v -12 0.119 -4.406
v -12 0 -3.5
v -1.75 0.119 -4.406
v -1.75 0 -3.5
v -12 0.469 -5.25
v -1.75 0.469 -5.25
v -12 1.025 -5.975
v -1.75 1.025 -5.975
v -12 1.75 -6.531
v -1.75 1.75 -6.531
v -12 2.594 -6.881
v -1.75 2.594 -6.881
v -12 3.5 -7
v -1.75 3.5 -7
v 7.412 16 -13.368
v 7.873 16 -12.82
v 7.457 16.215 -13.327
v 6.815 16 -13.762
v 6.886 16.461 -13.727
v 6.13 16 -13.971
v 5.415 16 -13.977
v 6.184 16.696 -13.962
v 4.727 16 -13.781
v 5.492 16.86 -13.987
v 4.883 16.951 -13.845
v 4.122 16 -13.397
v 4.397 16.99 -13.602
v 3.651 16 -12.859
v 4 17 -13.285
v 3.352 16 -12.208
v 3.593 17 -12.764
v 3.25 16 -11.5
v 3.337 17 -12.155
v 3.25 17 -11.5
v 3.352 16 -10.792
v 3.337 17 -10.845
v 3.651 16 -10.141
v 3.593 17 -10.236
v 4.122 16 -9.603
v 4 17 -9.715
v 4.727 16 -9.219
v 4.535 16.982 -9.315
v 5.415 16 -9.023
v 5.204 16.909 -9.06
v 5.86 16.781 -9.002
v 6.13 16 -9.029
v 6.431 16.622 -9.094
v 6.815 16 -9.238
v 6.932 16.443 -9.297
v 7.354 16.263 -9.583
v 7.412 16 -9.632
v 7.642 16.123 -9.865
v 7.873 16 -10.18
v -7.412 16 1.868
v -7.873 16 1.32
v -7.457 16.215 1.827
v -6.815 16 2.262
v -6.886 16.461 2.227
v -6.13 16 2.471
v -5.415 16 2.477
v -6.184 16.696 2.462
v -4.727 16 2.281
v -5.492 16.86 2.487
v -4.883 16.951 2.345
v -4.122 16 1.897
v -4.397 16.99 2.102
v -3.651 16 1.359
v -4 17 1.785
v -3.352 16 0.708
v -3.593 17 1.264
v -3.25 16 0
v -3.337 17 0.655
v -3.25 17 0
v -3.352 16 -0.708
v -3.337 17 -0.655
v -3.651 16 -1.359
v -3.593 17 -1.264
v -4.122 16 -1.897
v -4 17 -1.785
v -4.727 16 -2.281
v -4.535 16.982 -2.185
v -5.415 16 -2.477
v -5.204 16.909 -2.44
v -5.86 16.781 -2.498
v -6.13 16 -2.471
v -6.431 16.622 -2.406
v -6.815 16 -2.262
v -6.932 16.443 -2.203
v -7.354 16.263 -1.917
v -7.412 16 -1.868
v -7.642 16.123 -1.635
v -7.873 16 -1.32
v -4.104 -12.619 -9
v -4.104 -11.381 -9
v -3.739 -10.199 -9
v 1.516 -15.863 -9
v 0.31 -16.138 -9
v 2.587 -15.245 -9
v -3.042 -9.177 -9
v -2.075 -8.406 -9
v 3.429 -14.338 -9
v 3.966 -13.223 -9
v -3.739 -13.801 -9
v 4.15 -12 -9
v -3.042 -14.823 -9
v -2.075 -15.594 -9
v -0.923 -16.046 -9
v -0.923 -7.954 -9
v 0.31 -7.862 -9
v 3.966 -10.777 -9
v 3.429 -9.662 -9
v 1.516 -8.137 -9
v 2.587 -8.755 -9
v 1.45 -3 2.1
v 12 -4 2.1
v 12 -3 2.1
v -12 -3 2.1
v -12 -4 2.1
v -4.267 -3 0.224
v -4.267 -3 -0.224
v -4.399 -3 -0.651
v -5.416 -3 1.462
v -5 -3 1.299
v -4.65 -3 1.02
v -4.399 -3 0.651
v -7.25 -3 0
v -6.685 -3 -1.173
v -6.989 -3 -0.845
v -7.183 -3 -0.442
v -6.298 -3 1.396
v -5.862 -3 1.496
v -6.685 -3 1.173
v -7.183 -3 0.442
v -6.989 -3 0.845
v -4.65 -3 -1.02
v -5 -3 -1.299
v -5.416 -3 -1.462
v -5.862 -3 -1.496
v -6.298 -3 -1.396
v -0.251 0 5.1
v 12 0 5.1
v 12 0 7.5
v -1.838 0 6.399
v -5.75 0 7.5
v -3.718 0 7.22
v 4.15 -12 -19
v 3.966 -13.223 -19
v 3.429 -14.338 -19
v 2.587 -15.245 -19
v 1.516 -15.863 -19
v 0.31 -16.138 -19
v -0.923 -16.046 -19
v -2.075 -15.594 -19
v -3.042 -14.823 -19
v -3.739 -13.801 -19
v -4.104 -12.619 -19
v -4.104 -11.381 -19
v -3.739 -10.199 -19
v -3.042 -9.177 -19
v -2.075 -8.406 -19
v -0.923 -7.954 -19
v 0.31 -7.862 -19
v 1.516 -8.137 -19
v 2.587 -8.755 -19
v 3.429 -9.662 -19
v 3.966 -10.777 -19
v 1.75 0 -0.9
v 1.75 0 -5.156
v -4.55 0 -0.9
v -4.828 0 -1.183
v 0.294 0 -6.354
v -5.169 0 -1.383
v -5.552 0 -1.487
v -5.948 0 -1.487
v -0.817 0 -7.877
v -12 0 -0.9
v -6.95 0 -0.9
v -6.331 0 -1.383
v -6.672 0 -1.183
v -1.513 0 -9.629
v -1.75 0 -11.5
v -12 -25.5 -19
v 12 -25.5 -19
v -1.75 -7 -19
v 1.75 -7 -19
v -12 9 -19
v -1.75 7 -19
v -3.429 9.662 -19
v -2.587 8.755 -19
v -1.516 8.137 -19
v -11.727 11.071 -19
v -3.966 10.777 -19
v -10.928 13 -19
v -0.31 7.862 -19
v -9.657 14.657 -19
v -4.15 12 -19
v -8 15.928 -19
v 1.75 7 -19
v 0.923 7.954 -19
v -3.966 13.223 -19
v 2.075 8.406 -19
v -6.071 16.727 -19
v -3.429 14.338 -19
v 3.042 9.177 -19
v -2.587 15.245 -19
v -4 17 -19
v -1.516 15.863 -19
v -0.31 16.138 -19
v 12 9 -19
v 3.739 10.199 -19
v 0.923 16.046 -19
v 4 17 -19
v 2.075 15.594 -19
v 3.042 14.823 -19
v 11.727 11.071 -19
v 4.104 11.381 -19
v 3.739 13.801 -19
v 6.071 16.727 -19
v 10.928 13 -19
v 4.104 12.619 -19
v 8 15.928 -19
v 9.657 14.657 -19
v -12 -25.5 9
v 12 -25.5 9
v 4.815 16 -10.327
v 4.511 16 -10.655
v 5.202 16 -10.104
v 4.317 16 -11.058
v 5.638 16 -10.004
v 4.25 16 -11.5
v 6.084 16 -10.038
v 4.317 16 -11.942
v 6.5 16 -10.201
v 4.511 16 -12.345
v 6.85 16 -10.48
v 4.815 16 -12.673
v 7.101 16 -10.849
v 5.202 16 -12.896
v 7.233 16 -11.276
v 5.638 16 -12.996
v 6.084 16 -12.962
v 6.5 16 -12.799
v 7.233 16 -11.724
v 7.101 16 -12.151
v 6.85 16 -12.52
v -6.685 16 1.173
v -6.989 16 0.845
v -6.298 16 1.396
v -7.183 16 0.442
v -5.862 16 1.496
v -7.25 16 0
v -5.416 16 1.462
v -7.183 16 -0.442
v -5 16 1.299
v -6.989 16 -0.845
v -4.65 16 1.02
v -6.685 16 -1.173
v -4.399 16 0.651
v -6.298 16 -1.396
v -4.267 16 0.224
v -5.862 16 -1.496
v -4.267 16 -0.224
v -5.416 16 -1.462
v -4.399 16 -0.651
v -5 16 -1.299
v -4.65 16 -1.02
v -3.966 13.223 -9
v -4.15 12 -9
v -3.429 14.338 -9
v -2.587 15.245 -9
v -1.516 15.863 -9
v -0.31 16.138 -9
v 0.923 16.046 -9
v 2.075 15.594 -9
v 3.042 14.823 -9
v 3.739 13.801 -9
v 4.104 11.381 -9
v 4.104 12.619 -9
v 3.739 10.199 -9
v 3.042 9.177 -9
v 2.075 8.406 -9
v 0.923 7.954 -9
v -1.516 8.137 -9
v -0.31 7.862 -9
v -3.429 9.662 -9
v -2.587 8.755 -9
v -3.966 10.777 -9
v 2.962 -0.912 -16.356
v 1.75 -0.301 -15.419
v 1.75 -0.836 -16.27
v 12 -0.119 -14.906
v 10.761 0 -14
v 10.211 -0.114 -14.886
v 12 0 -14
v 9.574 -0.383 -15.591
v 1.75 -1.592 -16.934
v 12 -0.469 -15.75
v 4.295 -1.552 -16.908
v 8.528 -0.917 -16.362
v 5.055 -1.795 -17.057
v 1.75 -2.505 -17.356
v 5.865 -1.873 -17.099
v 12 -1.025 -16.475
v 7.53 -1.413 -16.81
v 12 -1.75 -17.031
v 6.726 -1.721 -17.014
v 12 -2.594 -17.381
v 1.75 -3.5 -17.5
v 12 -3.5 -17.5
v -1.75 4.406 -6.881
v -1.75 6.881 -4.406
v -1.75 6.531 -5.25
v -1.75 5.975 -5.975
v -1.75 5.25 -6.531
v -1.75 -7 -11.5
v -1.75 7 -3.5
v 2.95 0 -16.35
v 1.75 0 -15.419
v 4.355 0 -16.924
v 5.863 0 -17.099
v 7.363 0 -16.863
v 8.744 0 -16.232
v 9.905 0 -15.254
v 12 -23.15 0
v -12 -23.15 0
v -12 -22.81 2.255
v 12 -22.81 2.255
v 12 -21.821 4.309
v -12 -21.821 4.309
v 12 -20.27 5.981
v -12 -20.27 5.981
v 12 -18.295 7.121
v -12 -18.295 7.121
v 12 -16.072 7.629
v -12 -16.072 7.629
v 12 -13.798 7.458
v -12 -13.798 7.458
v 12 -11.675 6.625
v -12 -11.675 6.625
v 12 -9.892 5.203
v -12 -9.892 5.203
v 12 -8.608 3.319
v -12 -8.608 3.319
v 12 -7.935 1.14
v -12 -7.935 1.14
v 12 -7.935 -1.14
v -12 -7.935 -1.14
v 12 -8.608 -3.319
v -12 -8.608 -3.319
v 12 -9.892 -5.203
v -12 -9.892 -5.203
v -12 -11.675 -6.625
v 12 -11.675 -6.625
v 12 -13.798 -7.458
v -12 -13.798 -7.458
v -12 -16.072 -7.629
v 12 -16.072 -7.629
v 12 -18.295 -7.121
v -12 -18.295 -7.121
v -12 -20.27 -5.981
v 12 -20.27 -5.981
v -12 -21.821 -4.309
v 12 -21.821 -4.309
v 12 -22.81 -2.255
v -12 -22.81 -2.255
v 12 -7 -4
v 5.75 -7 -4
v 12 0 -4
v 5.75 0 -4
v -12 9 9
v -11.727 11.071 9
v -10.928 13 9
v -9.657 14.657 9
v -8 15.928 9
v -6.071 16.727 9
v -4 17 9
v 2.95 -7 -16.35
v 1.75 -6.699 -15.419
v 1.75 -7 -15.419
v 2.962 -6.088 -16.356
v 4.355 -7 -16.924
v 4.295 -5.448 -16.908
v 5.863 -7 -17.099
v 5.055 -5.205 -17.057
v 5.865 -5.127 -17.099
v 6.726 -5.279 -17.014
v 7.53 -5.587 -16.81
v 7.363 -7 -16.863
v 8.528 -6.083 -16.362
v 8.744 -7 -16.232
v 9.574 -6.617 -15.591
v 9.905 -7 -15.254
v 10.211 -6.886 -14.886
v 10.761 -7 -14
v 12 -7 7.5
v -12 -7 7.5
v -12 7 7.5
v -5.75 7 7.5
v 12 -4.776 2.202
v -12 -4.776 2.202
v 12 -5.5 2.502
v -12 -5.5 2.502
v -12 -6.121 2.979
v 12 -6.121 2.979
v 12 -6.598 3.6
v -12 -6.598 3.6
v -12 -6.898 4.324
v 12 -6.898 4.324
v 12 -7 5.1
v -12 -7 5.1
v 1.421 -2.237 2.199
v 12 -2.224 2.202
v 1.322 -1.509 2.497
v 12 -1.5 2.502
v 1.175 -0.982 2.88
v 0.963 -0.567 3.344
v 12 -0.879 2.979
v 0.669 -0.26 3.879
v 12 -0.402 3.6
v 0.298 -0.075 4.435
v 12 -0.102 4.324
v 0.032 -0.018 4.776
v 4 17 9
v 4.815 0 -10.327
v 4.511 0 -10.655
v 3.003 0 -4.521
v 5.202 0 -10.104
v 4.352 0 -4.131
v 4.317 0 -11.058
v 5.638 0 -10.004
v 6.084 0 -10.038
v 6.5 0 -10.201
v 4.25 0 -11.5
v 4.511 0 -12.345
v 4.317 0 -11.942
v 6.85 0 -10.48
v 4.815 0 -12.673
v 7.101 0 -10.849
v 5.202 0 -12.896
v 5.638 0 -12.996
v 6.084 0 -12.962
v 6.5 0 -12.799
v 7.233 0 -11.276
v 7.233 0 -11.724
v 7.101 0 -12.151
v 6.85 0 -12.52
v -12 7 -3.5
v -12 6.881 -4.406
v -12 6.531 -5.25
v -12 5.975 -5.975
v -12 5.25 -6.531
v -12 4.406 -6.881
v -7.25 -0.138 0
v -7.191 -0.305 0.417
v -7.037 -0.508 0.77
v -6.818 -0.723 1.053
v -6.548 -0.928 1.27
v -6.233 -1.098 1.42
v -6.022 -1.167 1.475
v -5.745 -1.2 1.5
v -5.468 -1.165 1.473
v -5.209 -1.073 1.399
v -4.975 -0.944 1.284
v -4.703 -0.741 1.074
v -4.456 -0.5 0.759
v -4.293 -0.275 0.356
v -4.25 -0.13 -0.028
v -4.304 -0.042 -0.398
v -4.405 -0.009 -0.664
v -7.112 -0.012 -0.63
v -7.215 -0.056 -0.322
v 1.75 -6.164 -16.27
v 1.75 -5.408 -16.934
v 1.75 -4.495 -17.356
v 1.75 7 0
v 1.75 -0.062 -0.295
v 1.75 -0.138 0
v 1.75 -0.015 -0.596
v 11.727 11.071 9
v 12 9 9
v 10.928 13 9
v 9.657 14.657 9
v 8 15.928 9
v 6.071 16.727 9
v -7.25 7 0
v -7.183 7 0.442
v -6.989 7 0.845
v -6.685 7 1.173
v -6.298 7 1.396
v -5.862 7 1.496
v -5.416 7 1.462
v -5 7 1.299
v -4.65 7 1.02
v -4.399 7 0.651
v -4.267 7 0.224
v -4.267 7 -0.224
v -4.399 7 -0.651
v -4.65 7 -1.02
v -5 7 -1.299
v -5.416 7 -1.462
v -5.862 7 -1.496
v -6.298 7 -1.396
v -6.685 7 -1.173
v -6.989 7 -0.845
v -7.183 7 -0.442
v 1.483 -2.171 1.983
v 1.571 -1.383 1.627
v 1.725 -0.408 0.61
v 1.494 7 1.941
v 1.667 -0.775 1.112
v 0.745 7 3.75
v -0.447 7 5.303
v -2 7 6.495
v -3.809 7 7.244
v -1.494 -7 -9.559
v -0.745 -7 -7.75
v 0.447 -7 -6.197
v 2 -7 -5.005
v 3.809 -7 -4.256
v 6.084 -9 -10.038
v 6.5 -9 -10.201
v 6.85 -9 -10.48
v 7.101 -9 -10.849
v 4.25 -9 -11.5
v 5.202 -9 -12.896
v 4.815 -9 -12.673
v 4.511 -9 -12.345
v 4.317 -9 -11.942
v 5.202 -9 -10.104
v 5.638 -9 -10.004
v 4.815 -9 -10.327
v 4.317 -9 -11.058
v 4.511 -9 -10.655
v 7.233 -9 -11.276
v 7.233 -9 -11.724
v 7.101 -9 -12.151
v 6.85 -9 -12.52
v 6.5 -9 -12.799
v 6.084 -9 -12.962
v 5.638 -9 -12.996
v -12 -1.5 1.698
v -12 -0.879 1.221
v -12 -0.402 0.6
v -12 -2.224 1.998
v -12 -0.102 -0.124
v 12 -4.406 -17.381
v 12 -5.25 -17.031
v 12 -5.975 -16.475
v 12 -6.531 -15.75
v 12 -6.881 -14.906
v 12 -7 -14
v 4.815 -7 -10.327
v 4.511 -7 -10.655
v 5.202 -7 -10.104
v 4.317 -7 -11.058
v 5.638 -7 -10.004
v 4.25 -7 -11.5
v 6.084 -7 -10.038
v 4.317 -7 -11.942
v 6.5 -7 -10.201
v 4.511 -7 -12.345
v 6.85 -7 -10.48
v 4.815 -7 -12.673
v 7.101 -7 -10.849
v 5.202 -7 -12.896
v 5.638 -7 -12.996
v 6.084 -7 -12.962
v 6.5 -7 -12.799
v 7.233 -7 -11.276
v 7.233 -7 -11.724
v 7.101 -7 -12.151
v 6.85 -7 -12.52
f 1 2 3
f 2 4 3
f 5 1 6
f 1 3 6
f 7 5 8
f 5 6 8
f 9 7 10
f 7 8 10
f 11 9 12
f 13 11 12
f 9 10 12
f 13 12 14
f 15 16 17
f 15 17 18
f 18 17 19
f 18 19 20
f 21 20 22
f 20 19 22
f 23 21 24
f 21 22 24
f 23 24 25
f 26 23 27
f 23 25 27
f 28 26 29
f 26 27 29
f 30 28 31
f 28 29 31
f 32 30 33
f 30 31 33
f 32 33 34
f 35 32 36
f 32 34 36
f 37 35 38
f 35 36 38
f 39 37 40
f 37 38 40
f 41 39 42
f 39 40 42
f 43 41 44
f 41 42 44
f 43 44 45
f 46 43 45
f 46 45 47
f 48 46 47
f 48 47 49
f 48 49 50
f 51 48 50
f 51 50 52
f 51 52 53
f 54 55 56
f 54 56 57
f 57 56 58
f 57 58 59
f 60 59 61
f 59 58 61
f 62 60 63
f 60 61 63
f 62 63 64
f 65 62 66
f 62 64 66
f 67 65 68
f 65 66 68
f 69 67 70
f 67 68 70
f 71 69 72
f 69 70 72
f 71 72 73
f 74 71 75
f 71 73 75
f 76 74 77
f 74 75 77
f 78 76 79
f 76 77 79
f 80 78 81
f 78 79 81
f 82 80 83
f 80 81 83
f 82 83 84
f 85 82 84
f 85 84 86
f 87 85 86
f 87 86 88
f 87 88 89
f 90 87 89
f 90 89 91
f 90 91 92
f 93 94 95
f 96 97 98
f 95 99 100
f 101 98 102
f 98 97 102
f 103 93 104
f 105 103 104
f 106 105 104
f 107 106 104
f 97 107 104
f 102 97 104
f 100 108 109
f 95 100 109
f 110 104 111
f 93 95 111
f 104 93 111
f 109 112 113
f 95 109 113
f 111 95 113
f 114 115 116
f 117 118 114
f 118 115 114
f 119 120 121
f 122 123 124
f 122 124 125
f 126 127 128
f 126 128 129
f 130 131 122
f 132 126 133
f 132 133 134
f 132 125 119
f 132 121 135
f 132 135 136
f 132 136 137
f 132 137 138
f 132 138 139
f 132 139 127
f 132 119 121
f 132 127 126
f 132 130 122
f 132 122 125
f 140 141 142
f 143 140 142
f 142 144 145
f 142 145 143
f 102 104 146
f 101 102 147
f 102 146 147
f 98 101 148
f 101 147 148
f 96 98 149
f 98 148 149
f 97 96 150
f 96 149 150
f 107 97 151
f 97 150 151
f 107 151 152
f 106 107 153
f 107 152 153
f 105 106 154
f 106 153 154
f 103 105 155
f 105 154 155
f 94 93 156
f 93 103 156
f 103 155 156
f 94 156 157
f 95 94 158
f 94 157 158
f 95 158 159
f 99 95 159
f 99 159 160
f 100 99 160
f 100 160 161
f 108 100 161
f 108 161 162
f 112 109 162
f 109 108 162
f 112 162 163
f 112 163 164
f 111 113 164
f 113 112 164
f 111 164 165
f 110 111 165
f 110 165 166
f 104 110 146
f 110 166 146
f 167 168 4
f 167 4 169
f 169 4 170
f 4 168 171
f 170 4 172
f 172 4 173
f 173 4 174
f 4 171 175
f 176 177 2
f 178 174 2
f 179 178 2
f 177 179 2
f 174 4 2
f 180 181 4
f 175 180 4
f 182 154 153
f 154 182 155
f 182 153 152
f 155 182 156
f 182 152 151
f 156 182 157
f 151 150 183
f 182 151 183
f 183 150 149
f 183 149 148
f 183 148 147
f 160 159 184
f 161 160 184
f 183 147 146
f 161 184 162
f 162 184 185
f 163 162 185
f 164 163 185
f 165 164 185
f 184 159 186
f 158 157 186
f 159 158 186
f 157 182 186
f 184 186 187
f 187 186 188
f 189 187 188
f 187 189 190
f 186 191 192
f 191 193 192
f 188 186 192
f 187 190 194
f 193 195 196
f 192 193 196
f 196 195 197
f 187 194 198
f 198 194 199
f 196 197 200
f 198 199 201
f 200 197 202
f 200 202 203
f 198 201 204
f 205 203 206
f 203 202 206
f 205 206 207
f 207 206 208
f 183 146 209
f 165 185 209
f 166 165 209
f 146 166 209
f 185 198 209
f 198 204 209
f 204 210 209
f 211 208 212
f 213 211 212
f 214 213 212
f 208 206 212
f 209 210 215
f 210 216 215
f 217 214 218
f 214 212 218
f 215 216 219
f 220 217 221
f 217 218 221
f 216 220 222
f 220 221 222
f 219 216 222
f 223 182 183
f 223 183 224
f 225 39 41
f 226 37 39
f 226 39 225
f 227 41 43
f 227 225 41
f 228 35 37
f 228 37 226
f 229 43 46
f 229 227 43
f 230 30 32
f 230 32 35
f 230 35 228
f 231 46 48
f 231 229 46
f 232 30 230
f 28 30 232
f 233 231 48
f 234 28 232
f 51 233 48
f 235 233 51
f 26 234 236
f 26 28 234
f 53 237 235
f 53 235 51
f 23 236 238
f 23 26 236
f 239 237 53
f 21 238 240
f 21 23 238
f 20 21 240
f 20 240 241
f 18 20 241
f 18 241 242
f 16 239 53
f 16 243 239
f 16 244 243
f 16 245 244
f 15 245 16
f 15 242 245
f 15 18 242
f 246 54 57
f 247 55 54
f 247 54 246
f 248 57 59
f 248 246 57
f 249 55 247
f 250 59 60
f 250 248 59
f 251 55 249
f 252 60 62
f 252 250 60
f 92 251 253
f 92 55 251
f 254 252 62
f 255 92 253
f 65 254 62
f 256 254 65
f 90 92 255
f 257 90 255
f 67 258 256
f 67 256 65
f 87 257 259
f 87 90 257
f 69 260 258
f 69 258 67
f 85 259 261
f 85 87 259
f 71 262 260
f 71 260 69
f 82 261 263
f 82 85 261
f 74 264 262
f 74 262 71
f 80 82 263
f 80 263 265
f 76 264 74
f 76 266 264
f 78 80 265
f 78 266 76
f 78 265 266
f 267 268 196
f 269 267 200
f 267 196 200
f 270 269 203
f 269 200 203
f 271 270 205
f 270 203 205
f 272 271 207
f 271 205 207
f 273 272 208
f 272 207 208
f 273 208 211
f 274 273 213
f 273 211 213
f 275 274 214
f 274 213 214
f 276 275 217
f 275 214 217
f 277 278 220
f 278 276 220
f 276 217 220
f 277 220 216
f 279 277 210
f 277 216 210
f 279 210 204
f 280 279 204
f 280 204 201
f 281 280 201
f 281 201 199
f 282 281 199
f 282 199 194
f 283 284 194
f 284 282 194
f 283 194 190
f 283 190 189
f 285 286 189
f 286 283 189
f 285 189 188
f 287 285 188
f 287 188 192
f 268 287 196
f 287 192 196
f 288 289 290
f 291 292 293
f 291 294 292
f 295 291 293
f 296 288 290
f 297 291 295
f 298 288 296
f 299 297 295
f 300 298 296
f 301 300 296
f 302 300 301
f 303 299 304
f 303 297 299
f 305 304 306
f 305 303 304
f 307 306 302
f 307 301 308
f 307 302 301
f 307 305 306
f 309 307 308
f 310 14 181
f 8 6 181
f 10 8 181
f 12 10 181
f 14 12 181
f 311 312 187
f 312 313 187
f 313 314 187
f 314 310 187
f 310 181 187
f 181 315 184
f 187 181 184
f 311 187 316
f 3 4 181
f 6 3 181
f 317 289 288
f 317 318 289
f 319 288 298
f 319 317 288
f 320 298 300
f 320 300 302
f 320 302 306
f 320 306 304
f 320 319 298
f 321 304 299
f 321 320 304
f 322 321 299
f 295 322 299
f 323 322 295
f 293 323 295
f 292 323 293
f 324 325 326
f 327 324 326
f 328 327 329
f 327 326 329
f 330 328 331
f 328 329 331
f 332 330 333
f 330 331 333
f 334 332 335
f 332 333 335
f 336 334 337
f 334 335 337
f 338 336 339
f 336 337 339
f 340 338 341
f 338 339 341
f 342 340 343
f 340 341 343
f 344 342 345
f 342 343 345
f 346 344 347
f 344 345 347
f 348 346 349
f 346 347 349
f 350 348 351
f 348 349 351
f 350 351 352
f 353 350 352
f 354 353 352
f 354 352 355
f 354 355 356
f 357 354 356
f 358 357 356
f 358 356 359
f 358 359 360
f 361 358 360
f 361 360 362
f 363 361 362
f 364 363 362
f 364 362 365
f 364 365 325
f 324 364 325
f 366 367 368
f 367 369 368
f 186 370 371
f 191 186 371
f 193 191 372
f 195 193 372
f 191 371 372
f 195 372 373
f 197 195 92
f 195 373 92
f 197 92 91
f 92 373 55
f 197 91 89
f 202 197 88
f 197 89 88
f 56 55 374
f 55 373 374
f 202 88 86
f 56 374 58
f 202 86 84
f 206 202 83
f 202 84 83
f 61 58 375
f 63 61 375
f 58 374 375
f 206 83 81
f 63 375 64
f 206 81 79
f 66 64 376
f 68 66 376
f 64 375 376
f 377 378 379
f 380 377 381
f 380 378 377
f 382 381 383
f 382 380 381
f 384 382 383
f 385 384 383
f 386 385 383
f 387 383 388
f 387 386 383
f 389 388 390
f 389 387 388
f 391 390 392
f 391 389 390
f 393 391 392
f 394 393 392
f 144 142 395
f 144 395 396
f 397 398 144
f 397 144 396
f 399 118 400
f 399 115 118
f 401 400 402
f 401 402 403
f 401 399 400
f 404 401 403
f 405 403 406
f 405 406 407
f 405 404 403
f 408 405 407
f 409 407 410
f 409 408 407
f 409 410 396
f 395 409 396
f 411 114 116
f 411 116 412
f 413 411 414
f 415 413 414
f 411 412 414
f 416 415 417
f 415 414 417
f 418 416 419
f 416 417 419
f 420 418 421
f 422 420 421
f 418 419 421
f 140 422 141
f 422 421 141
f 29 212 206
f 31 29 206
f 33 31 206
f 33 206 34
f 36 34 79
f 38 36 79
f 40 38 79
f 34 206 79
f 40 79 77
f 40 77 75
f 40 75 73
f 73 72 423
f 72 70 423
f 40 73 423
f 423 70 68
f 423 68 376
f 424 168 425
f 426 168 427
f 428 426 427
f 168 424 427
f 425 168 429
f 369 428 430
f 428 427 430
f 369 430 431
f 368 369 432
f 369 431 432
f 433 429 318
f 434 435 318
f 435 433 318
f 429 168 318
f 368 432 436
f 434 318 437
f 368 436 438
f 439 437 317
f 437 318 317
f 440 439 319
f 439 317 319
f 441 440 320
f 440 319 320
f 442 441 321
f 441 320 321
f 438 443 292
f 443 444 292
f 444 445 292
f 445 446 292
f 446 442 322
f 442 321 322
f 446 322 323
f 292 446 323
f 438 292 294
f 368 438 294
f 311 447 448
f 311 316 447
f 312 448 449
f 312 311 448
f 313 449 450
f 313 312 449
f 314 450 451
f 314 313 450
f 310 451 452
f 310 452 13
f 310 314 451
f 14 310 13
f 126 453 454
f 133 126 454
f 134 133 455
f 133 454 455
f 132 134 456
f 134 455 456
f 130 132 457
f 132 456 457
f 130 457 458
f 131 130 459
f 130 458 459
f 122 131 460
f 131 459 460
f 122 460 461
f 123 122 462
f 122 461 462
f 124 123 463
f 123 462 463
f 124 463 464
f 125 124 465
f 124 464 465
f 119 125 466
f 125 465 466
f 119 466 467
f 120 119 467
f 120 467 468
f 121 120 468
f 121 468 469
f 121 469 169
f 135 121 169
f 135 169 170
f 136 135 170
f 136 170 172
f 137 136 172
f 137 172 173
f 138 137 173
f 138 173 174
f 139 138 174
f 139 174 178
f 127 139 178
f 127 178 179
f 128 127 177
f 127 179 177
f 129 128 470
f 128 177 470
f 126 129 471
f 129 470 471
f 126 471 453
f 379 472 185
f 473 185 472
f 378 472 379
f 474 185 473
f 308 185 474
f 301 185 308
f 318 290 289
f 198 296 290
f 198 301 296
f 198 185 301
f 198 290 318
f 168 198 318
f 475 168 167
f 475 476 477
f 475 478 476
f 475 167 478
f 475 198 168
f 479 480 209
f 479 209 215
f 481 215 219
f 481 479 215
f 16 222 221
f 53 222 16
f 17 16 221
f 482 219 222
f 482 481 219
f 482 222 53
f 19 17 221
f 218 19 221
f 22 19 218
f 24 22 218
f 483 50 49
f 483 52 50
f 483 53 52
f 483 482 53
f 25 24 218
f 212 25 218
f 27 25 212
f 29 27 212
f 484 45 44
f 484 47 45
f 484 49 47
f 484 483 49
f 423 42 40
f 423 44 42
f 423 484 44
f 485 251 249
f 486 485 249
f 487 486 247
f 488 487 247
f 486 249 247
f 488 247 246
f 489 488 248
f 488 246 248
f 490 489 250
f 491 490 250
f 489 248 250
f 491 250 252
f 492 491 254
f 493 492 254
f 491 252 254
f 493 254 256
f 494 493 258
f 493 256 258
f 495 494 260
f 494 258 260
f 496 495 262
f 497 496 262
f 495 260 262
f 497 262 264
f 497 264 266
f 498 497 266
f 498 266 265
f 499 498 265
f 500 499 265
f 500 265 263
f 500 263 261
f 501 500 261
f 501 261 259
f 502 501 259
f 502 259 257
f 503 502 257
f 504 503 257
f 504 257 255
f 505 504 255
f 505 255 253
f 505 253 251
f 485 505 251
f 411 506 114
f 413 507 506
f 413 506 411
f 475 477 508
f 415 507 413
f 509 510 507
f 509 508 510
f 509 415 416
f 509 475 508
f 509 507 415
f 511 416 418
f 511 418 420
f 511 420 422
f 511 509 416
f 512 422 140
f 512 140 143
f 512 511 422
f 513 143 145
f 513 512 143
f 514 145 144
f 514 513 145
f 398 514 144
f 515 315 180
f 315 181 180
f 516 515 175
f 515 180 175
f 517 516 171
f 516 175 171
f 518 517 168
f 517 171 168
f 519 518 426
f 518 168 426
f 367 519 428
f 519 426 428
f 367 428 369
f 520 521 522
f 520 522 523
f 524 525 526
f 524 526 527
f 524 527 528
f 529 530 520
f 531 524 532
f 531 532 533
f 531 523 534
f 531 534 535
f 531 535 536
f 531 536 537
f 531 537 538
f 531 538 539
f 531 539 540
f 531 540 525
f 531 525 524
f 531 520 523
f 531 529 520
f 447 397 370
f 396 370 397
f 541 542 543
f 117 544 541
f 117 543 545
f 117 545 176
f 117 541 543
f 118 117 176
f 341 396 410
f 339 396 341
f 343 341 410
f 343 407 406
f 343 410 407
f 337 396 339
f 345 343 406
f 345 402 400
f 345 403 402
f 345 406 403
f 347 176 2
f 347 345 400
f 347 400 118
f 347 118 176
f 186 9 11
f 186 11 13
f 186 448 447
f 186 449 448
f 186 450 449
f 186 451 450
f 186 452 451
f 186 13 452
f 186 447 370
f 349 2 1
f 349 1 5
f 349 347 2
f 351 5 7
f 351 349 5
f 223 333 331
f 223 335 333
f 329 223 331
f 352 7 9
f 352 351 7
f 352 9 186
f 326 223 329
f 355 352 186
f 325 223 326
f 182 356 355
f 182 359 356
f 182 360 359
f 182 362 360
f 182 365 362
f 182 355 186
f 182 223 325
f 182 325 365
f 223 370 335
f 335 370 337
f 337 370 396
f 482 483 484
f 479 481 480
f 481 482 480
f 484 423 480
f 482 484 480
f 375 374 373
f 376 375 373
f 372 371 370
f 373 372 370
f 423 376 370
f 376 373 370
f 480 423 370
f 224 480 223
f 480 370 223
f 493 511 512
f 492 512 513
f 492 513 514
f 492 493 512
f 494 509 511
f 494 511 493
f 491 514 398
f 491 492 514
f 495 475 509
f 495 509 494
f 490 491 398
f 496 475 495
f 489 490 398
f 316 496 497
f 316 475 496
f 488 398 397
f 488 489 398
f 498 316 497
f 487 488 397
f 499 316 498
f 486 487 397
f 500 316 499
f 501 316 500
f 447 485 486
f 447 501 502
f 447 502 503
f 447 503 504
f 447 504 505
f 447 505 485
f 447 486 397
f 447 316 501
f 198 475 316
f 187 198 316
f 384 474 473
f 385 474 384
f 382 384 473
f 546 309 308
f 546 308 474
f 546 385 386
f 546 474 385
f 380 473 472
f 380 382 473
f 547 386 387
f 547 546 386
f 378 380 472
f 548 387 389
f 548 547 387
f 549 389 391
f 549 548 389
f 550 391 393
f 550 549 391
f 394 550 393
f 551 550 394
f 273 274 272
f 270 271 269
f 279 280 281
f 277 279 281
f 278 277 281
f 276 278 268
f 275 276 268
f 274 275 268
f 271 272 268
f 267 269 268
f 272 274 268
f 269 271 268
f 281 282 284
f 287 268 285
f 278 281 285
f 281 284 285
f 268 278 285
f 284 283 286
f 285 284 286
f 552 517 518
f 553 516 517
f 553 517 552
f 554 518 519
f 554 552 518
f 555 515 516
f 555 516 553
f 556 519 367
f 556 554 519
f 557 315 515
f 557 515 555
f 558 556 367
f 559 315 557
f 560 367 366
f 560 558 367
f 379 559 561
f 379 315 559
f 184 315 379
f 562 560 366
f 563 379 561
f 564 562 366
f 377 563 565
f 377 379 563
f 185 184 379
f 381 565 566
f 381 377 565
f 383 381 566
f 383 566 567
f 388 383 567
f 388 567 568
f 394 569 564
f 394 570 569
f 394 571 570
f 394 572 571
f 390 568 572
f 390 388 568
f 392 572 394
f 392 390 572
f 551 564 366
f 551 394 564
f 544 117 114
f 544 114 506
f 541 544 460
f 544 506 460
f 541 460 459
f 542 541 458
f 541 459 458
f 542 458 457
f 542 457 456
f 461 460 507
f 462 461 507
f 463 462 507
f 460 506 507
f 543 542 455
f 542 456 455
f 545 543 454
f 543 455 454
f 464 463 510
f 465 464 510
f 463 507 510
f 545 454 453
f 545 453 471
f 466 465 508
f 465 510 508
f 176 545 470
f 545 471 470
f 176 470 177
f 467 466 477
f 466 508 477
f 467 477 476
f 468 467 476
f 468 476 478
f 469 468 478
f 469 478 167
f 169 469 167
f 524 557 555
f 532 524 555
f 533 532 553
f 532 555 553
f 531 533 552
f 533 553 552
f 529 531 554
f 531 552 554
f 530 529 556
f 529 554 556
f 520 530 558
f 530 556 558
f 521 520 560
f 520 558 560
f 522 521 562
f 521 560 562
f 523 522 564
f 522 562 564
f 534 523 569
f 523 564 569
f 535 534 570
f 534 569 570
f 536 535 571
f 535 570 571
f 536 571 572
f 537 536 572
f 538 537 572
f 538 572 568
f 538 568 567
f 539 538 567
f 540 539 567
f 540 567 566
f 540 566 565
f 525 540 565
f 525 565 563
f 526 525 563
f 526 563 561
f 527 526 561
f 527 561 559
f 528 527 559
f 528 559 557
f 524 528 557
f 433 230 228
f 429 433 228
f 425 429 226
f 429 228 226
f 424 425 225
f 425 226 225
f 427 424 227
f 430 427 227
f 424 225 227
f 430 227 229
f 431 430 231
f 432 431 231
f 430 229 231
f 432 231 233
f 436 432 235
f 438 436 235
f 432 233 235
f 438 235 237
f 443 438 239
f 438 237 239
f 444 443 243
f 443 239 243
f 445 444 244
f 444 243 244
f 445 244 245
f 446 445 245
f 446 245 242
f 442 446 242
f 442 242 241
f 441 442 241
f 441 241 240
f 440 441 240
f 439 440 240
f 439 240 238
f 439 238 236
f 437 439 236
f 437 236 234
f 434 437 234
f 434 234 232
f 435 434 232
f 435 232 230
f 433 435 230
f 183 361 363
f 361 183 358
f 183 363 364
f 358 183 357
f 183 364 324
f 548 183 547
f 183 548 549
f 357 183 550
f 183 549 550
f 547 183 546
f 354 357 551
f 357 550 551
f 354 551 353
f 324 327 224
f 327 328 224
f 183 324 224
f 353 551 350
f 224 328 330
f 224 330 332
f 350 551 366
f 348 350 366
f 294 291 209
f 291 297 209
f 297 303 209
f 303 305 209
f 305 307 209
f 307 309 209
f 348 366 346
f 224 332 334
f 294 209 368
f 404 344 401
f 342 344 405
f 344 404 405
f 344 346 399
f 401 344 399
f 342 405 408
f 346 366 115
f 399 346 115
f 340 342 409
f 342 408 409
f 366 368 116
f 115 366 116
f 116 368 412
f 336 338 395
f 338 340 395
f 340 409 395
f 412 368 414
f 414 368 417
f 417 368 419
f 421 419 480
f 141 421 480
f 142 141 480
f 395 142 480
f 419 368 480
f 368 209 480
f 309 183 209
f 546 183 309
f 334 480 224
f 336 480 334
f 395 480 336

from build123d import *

# Parameters (mm, degrees)
SKETCH_1_W           = 24
SKETCH_1_H           = 36
EXTRUDE_1_DEPTH      = 19
CUT_EXTRUDE_2_DEPTH  = 3.5
SKETCH_4_W           = 5.4
SKETCH_4_H           = 7
CUT_EXTRUDE_3_DEPTH  = 36.510561809
CUT_EXTRUDE_4_DEPTH  = 3.5
SKETCH_6_R           = 4.15
CUT_EXTRUDE_5_DEPTH  = 44.726422218
FILLET_2_R           = 3
SKETCH_10_W          = 10
SKETCH_10_H          = 36
CUT_EXTRUDE_9_DEPTH  = 36.510561809
SKETCH_11_W          = 28
SKETCH_11_H          = 16.5
EXTRUDE_3_DEPTH      = 24
SKETCH_12_W          = 10.25
SKETCH_12_H          = 12
EXTRUDE_4_DEPTH      = 7
FILLET_3_R           = 3.5
SKETCH_13_W          = 10.25
SKETCH_13_H          = 1.5
EXTRUDE_5_DEPTH      = 7
FILLET_4_R           = 3.5
SKETCH_14_R          = 5.6
CUT_EXTRUDE_10_DEPTH = 7
FILLET_6_R           = 3
EXTRUDE_START        = -18
SKETCH_16_R          = 4.15
EXTRUDE_6_DEPTH      = 18
SKETCH_18_R          = 7.65
SKETCH_18_W          = 28
SKETCH_18_H          = 9
SKETCH_18_H_2        = 17.5
CUT_EXTRUDE_11_DEPTH = 47.122120558
FILLET_7_R           = 8
SKETCH_19_R          = 1.5
CUT_EXTRUDE_12_DEPTH = 26
SKETCH_20_R          = 1.5
CUT_EXTRUDE_13_DEPTH = 20
SKETCH_21_R          = 2.5
CUT_EXTRUDE_14_DEPTH = 1


with BuildPart() as part:
    # 草图1 → 凸台-拉伸1 (new, symmetric)
    with BuildSketch(Plane.XY):
        Rectangle(SKETCH_1_W, SKETCH_1_H)
    extrude(amount=EXTRUDE_1_DEPTH, both=True)

    # 草图3 → 切除-拉伸2 (cut, symmetric)
    with BuildSketch(Plane(origin=(0, 3.5, 0), x_dir=(1, 0, 0), z_dir=(0, 1, 0))):
        with BuildLine():
            Line((-5.75, -7.5), (-12, -7.5))
            Line((-12, -7.5), (-12, 19))
            Line((-12, 19), (1.75, 19))
            Line((1.75, 19), (1.75, 0))
            ThreePointArc((1.75, 0), (-0.446699141, -5.303300859), (-5.75, -7.5))
        make_face()
    extrude(amount=CUT_EXTRUDE_2_DEPTH, both=True, mode=Mode.SUBTRACT)

    # 草图4 → 切除-拉伸3 (cut, through all)
    with BuildSketch(Plane.ZY.offset(12)):
        with Locations((4.8, -3.5)):
            Rectangle(SKETCH_4_W, SKETCH_4_H)
    extrude(amount=-CUT_EXTRUDE_3_DEPTH, mode=Mode.SUBTRACT)

    # 草图5 → 切除-拉伸4 (cut, symmetric)
    with BuildSketch(Plane(origin=(0, -3.5, 0), x_dir=(1, 0, 0), z_dir=(0, 1, 0))):
        with BuildLine():
            Line((5.75, 4), (12, 4))
            Line((12, 4), (12, 19))
            Line((12, 19), (-1.75, 19))
            Line((-1.75, 19), (-1.75, 11.5))
            ThreePointArc((-1.75, 11.5), (0.446699141, 6.196699141), (5.75, 4))
        make_face()
    extrude(amount=CUT_EXTRUDE_4_DEPTH, both=True, mode=Mode.SUBTRACT)

    # 草图6 → 切除-拉伸5 (cut, through all)
    with BuildSketch(Plane(origin=(0, 0, -19), x_dir=(-1, 0, 0), z_dir=(0, 0, -1))):
        with Locations((0, 12)):
            Circle(SKETCH_6_R)
        with Locations(Location((0, -12, 0), (0, 0, 180))):
            Circle(SKETCH_6_R)
    extrude(amount=-CUT_EXTRUDE_5_DEPTH, mode=Mode.SUBTRACT)

    # 圆角2
    fillet_2_edges = [part.edges().sort_by_distance(p)[0] for p in [
        (6.725, 0, 2.1),
        (0, -7, 2.1),
    ]]
    fillet(fillet_2_edges, radius=FILLET_2_R)

    # 草图10 → 切除-拉伸9 (cut, through all)
    with BuildSketch(Plane(origin=(12, 0, 0), x_dir=(0, 0, -1), z_dir=(1, 0, 0))):
        with Locations((-14, 0)):
            Rectangle(SKETCH_10_W, SKETCH_10_H)
    extrude(amount=-CUT_EXTRUDE_9_DEPTH, mode=Mode.SUBTRACT)

    # 草图11 → 凸台-拉伸3 (add)
    with BuildSketch(Plane.ZY.offset(12)):
        with Locations((-5, -26.25)):
            Rectangle(SKETCH_11_W, SKETCH_11_H)
    extrude_3 = extrude(amount=-EXTRUDE_3_DEPTH)

    # 镜向2: 凸台-拉伸3 across plane
    add(extrude_3.mirror(Plane.ZX))

    # 草图12 → 凸台-拉伸4 (add)
    with BuildSketch(Plane(origin=(0, 0, 0), x_dir=(1, 0, 0), z_dir=(0, 1, 0))):
        with Locations((-6.875, 13)):
            Rectangle(SKETCH_12_W, SKETCH_12_H)
    extrude(amount=EXTRUDE_4_DEPTH)

    # 圆角3
    fillet_3_edges = [part.edges().sort_by_distance(p)[0] for p in [
        (-6.875, 0, -7),
        (-6.875, 7, -7),
    ]]
    fillet(fillet_3_edges, radius=FILLET_3_R - 0.0001)  # a hair under: the kernel refuses the full size

    # 草图13 → 凸台-拉伸5 (add)
    with BuildSketch(Plane.XZ):
        with Locations((6.875, -18.25)):
            Rectangle(SKETCH_13_W, SKETCH_13_H)
    extrude(amount=EXTRUDE_5_DEPTH)

    # 圆角4
    fillet_4_edges = [part.edges().sort_by_distance(p)[0] for p in [
        (6.875, 0, -17.5),
        (6.875, -7, -17.5),
    ]]
    fillet(fillet_4_edges, radius=FILLET_4_R - 0.0001)  # a hair under: the kernel refuses the full size

    # 草图14 → 切除-拉伸10 (cut)
    with BuildSketch(Plane.XZ):
        with Locations((5.75, -11.5)):
            Circle(SKETCH_14_R)
    extrude(amount=CUT_EXTRUDE_10_DEPTH, mode=Mode.SUBTRACT)

    # 圆角6
    fillet_6_edges = [part.edges().sort_by_distance(p)[0] for p in [
        (-5.275, 0, 2.1),
    ]]
    fillet(fillet_6_edges, radius=FILLET_6_R)

    # 草图16 → 凸台-拉伸6 (add)
    with BuildSketch(Plane.XY.offset(9).offset(EXTRUDE_START)):
        with Locations((0, -12)):
            Circle(SKETCH_16_R)
        with Locations(Location((0, 12, 0), (0, 0, 180))):
            Circle(SKETCH_16_R)
    extrude(amount=EXTRUDE_6_DEPTH)

    # 草图18 → 切除-拉伸11 (cut, through all)
    with BuildSketch(Plane.ZY.offset(12)):
        with Locations(Location((0, -15.5, 0), (0, 0, 270))):
            Circle(SKETCH_18_R)
        with Locations((-5, -30)):
            Rectangle(SKETCH_18_W, SKETCH_18_H)
        with Locations((-5, 25.75)):
            Rectangle(SKETCH_18_W, SKETCH_18_H_2)
    extrude(amount=-CUT_EXTRUDE_11_DEPTH, mode=Mode.SUBTRACT)

    # 圆角7
    fillet_7_edges = [part.edges().sort_by_distance(p)[0] for p in [
        (12, 17, -5),
        (-12, 17, -5),
    ]]
    fillet(fillet_7_edges, radius=FILLET_7_R)

    # 草图19 → 切除-拉伸12 (cut)
    with BuildSketch(Plane(origin=(0, 17, 0), x_dir=(1, 0, 0), z_dir=(0, 1, 0))):
        with Locations(Location((5.75, 11.5, 0), (0, 0, 180))):
            Circle(SKETCH_19_R)
    extrude(amount=-CUT_EXTRUDE_12_DEPTH, mode=Mode.SUBTRACT)

    # 草图20 → 切除-拉伸13 (cut)
    with BuildSketch(Plane(origin=(0, 17, 0), x_dir=(1, 0, 0), z_dir=(0, 1, 0))):
        with Locations(Location((-5.75, 0, 0), (0, 0, 180))):
            Circle(SKETCH_20_R)
    extrude(amount=-CUT_EXTRUDE_13_DEPTH, mode=Mode.SUBTRACT)

    # 草图21 → 切除-拉伸14 (cut)
    with BuildSketch(Plane(origin=(0, 17, 0), x_dir=(1, 0, 0), z_dir=(0, 1, 0))):
        with Locations((5.75, 11.5)):
            Circle(SKETCH_21_R)
        with Locations((-5.75, 0)):
            Circle(SKETCH_21_R)
    extrude(amount=-CUT_EXTRUDE_14_DEPTH, mode=Mode.SUBTRACT)


solid = part.part
